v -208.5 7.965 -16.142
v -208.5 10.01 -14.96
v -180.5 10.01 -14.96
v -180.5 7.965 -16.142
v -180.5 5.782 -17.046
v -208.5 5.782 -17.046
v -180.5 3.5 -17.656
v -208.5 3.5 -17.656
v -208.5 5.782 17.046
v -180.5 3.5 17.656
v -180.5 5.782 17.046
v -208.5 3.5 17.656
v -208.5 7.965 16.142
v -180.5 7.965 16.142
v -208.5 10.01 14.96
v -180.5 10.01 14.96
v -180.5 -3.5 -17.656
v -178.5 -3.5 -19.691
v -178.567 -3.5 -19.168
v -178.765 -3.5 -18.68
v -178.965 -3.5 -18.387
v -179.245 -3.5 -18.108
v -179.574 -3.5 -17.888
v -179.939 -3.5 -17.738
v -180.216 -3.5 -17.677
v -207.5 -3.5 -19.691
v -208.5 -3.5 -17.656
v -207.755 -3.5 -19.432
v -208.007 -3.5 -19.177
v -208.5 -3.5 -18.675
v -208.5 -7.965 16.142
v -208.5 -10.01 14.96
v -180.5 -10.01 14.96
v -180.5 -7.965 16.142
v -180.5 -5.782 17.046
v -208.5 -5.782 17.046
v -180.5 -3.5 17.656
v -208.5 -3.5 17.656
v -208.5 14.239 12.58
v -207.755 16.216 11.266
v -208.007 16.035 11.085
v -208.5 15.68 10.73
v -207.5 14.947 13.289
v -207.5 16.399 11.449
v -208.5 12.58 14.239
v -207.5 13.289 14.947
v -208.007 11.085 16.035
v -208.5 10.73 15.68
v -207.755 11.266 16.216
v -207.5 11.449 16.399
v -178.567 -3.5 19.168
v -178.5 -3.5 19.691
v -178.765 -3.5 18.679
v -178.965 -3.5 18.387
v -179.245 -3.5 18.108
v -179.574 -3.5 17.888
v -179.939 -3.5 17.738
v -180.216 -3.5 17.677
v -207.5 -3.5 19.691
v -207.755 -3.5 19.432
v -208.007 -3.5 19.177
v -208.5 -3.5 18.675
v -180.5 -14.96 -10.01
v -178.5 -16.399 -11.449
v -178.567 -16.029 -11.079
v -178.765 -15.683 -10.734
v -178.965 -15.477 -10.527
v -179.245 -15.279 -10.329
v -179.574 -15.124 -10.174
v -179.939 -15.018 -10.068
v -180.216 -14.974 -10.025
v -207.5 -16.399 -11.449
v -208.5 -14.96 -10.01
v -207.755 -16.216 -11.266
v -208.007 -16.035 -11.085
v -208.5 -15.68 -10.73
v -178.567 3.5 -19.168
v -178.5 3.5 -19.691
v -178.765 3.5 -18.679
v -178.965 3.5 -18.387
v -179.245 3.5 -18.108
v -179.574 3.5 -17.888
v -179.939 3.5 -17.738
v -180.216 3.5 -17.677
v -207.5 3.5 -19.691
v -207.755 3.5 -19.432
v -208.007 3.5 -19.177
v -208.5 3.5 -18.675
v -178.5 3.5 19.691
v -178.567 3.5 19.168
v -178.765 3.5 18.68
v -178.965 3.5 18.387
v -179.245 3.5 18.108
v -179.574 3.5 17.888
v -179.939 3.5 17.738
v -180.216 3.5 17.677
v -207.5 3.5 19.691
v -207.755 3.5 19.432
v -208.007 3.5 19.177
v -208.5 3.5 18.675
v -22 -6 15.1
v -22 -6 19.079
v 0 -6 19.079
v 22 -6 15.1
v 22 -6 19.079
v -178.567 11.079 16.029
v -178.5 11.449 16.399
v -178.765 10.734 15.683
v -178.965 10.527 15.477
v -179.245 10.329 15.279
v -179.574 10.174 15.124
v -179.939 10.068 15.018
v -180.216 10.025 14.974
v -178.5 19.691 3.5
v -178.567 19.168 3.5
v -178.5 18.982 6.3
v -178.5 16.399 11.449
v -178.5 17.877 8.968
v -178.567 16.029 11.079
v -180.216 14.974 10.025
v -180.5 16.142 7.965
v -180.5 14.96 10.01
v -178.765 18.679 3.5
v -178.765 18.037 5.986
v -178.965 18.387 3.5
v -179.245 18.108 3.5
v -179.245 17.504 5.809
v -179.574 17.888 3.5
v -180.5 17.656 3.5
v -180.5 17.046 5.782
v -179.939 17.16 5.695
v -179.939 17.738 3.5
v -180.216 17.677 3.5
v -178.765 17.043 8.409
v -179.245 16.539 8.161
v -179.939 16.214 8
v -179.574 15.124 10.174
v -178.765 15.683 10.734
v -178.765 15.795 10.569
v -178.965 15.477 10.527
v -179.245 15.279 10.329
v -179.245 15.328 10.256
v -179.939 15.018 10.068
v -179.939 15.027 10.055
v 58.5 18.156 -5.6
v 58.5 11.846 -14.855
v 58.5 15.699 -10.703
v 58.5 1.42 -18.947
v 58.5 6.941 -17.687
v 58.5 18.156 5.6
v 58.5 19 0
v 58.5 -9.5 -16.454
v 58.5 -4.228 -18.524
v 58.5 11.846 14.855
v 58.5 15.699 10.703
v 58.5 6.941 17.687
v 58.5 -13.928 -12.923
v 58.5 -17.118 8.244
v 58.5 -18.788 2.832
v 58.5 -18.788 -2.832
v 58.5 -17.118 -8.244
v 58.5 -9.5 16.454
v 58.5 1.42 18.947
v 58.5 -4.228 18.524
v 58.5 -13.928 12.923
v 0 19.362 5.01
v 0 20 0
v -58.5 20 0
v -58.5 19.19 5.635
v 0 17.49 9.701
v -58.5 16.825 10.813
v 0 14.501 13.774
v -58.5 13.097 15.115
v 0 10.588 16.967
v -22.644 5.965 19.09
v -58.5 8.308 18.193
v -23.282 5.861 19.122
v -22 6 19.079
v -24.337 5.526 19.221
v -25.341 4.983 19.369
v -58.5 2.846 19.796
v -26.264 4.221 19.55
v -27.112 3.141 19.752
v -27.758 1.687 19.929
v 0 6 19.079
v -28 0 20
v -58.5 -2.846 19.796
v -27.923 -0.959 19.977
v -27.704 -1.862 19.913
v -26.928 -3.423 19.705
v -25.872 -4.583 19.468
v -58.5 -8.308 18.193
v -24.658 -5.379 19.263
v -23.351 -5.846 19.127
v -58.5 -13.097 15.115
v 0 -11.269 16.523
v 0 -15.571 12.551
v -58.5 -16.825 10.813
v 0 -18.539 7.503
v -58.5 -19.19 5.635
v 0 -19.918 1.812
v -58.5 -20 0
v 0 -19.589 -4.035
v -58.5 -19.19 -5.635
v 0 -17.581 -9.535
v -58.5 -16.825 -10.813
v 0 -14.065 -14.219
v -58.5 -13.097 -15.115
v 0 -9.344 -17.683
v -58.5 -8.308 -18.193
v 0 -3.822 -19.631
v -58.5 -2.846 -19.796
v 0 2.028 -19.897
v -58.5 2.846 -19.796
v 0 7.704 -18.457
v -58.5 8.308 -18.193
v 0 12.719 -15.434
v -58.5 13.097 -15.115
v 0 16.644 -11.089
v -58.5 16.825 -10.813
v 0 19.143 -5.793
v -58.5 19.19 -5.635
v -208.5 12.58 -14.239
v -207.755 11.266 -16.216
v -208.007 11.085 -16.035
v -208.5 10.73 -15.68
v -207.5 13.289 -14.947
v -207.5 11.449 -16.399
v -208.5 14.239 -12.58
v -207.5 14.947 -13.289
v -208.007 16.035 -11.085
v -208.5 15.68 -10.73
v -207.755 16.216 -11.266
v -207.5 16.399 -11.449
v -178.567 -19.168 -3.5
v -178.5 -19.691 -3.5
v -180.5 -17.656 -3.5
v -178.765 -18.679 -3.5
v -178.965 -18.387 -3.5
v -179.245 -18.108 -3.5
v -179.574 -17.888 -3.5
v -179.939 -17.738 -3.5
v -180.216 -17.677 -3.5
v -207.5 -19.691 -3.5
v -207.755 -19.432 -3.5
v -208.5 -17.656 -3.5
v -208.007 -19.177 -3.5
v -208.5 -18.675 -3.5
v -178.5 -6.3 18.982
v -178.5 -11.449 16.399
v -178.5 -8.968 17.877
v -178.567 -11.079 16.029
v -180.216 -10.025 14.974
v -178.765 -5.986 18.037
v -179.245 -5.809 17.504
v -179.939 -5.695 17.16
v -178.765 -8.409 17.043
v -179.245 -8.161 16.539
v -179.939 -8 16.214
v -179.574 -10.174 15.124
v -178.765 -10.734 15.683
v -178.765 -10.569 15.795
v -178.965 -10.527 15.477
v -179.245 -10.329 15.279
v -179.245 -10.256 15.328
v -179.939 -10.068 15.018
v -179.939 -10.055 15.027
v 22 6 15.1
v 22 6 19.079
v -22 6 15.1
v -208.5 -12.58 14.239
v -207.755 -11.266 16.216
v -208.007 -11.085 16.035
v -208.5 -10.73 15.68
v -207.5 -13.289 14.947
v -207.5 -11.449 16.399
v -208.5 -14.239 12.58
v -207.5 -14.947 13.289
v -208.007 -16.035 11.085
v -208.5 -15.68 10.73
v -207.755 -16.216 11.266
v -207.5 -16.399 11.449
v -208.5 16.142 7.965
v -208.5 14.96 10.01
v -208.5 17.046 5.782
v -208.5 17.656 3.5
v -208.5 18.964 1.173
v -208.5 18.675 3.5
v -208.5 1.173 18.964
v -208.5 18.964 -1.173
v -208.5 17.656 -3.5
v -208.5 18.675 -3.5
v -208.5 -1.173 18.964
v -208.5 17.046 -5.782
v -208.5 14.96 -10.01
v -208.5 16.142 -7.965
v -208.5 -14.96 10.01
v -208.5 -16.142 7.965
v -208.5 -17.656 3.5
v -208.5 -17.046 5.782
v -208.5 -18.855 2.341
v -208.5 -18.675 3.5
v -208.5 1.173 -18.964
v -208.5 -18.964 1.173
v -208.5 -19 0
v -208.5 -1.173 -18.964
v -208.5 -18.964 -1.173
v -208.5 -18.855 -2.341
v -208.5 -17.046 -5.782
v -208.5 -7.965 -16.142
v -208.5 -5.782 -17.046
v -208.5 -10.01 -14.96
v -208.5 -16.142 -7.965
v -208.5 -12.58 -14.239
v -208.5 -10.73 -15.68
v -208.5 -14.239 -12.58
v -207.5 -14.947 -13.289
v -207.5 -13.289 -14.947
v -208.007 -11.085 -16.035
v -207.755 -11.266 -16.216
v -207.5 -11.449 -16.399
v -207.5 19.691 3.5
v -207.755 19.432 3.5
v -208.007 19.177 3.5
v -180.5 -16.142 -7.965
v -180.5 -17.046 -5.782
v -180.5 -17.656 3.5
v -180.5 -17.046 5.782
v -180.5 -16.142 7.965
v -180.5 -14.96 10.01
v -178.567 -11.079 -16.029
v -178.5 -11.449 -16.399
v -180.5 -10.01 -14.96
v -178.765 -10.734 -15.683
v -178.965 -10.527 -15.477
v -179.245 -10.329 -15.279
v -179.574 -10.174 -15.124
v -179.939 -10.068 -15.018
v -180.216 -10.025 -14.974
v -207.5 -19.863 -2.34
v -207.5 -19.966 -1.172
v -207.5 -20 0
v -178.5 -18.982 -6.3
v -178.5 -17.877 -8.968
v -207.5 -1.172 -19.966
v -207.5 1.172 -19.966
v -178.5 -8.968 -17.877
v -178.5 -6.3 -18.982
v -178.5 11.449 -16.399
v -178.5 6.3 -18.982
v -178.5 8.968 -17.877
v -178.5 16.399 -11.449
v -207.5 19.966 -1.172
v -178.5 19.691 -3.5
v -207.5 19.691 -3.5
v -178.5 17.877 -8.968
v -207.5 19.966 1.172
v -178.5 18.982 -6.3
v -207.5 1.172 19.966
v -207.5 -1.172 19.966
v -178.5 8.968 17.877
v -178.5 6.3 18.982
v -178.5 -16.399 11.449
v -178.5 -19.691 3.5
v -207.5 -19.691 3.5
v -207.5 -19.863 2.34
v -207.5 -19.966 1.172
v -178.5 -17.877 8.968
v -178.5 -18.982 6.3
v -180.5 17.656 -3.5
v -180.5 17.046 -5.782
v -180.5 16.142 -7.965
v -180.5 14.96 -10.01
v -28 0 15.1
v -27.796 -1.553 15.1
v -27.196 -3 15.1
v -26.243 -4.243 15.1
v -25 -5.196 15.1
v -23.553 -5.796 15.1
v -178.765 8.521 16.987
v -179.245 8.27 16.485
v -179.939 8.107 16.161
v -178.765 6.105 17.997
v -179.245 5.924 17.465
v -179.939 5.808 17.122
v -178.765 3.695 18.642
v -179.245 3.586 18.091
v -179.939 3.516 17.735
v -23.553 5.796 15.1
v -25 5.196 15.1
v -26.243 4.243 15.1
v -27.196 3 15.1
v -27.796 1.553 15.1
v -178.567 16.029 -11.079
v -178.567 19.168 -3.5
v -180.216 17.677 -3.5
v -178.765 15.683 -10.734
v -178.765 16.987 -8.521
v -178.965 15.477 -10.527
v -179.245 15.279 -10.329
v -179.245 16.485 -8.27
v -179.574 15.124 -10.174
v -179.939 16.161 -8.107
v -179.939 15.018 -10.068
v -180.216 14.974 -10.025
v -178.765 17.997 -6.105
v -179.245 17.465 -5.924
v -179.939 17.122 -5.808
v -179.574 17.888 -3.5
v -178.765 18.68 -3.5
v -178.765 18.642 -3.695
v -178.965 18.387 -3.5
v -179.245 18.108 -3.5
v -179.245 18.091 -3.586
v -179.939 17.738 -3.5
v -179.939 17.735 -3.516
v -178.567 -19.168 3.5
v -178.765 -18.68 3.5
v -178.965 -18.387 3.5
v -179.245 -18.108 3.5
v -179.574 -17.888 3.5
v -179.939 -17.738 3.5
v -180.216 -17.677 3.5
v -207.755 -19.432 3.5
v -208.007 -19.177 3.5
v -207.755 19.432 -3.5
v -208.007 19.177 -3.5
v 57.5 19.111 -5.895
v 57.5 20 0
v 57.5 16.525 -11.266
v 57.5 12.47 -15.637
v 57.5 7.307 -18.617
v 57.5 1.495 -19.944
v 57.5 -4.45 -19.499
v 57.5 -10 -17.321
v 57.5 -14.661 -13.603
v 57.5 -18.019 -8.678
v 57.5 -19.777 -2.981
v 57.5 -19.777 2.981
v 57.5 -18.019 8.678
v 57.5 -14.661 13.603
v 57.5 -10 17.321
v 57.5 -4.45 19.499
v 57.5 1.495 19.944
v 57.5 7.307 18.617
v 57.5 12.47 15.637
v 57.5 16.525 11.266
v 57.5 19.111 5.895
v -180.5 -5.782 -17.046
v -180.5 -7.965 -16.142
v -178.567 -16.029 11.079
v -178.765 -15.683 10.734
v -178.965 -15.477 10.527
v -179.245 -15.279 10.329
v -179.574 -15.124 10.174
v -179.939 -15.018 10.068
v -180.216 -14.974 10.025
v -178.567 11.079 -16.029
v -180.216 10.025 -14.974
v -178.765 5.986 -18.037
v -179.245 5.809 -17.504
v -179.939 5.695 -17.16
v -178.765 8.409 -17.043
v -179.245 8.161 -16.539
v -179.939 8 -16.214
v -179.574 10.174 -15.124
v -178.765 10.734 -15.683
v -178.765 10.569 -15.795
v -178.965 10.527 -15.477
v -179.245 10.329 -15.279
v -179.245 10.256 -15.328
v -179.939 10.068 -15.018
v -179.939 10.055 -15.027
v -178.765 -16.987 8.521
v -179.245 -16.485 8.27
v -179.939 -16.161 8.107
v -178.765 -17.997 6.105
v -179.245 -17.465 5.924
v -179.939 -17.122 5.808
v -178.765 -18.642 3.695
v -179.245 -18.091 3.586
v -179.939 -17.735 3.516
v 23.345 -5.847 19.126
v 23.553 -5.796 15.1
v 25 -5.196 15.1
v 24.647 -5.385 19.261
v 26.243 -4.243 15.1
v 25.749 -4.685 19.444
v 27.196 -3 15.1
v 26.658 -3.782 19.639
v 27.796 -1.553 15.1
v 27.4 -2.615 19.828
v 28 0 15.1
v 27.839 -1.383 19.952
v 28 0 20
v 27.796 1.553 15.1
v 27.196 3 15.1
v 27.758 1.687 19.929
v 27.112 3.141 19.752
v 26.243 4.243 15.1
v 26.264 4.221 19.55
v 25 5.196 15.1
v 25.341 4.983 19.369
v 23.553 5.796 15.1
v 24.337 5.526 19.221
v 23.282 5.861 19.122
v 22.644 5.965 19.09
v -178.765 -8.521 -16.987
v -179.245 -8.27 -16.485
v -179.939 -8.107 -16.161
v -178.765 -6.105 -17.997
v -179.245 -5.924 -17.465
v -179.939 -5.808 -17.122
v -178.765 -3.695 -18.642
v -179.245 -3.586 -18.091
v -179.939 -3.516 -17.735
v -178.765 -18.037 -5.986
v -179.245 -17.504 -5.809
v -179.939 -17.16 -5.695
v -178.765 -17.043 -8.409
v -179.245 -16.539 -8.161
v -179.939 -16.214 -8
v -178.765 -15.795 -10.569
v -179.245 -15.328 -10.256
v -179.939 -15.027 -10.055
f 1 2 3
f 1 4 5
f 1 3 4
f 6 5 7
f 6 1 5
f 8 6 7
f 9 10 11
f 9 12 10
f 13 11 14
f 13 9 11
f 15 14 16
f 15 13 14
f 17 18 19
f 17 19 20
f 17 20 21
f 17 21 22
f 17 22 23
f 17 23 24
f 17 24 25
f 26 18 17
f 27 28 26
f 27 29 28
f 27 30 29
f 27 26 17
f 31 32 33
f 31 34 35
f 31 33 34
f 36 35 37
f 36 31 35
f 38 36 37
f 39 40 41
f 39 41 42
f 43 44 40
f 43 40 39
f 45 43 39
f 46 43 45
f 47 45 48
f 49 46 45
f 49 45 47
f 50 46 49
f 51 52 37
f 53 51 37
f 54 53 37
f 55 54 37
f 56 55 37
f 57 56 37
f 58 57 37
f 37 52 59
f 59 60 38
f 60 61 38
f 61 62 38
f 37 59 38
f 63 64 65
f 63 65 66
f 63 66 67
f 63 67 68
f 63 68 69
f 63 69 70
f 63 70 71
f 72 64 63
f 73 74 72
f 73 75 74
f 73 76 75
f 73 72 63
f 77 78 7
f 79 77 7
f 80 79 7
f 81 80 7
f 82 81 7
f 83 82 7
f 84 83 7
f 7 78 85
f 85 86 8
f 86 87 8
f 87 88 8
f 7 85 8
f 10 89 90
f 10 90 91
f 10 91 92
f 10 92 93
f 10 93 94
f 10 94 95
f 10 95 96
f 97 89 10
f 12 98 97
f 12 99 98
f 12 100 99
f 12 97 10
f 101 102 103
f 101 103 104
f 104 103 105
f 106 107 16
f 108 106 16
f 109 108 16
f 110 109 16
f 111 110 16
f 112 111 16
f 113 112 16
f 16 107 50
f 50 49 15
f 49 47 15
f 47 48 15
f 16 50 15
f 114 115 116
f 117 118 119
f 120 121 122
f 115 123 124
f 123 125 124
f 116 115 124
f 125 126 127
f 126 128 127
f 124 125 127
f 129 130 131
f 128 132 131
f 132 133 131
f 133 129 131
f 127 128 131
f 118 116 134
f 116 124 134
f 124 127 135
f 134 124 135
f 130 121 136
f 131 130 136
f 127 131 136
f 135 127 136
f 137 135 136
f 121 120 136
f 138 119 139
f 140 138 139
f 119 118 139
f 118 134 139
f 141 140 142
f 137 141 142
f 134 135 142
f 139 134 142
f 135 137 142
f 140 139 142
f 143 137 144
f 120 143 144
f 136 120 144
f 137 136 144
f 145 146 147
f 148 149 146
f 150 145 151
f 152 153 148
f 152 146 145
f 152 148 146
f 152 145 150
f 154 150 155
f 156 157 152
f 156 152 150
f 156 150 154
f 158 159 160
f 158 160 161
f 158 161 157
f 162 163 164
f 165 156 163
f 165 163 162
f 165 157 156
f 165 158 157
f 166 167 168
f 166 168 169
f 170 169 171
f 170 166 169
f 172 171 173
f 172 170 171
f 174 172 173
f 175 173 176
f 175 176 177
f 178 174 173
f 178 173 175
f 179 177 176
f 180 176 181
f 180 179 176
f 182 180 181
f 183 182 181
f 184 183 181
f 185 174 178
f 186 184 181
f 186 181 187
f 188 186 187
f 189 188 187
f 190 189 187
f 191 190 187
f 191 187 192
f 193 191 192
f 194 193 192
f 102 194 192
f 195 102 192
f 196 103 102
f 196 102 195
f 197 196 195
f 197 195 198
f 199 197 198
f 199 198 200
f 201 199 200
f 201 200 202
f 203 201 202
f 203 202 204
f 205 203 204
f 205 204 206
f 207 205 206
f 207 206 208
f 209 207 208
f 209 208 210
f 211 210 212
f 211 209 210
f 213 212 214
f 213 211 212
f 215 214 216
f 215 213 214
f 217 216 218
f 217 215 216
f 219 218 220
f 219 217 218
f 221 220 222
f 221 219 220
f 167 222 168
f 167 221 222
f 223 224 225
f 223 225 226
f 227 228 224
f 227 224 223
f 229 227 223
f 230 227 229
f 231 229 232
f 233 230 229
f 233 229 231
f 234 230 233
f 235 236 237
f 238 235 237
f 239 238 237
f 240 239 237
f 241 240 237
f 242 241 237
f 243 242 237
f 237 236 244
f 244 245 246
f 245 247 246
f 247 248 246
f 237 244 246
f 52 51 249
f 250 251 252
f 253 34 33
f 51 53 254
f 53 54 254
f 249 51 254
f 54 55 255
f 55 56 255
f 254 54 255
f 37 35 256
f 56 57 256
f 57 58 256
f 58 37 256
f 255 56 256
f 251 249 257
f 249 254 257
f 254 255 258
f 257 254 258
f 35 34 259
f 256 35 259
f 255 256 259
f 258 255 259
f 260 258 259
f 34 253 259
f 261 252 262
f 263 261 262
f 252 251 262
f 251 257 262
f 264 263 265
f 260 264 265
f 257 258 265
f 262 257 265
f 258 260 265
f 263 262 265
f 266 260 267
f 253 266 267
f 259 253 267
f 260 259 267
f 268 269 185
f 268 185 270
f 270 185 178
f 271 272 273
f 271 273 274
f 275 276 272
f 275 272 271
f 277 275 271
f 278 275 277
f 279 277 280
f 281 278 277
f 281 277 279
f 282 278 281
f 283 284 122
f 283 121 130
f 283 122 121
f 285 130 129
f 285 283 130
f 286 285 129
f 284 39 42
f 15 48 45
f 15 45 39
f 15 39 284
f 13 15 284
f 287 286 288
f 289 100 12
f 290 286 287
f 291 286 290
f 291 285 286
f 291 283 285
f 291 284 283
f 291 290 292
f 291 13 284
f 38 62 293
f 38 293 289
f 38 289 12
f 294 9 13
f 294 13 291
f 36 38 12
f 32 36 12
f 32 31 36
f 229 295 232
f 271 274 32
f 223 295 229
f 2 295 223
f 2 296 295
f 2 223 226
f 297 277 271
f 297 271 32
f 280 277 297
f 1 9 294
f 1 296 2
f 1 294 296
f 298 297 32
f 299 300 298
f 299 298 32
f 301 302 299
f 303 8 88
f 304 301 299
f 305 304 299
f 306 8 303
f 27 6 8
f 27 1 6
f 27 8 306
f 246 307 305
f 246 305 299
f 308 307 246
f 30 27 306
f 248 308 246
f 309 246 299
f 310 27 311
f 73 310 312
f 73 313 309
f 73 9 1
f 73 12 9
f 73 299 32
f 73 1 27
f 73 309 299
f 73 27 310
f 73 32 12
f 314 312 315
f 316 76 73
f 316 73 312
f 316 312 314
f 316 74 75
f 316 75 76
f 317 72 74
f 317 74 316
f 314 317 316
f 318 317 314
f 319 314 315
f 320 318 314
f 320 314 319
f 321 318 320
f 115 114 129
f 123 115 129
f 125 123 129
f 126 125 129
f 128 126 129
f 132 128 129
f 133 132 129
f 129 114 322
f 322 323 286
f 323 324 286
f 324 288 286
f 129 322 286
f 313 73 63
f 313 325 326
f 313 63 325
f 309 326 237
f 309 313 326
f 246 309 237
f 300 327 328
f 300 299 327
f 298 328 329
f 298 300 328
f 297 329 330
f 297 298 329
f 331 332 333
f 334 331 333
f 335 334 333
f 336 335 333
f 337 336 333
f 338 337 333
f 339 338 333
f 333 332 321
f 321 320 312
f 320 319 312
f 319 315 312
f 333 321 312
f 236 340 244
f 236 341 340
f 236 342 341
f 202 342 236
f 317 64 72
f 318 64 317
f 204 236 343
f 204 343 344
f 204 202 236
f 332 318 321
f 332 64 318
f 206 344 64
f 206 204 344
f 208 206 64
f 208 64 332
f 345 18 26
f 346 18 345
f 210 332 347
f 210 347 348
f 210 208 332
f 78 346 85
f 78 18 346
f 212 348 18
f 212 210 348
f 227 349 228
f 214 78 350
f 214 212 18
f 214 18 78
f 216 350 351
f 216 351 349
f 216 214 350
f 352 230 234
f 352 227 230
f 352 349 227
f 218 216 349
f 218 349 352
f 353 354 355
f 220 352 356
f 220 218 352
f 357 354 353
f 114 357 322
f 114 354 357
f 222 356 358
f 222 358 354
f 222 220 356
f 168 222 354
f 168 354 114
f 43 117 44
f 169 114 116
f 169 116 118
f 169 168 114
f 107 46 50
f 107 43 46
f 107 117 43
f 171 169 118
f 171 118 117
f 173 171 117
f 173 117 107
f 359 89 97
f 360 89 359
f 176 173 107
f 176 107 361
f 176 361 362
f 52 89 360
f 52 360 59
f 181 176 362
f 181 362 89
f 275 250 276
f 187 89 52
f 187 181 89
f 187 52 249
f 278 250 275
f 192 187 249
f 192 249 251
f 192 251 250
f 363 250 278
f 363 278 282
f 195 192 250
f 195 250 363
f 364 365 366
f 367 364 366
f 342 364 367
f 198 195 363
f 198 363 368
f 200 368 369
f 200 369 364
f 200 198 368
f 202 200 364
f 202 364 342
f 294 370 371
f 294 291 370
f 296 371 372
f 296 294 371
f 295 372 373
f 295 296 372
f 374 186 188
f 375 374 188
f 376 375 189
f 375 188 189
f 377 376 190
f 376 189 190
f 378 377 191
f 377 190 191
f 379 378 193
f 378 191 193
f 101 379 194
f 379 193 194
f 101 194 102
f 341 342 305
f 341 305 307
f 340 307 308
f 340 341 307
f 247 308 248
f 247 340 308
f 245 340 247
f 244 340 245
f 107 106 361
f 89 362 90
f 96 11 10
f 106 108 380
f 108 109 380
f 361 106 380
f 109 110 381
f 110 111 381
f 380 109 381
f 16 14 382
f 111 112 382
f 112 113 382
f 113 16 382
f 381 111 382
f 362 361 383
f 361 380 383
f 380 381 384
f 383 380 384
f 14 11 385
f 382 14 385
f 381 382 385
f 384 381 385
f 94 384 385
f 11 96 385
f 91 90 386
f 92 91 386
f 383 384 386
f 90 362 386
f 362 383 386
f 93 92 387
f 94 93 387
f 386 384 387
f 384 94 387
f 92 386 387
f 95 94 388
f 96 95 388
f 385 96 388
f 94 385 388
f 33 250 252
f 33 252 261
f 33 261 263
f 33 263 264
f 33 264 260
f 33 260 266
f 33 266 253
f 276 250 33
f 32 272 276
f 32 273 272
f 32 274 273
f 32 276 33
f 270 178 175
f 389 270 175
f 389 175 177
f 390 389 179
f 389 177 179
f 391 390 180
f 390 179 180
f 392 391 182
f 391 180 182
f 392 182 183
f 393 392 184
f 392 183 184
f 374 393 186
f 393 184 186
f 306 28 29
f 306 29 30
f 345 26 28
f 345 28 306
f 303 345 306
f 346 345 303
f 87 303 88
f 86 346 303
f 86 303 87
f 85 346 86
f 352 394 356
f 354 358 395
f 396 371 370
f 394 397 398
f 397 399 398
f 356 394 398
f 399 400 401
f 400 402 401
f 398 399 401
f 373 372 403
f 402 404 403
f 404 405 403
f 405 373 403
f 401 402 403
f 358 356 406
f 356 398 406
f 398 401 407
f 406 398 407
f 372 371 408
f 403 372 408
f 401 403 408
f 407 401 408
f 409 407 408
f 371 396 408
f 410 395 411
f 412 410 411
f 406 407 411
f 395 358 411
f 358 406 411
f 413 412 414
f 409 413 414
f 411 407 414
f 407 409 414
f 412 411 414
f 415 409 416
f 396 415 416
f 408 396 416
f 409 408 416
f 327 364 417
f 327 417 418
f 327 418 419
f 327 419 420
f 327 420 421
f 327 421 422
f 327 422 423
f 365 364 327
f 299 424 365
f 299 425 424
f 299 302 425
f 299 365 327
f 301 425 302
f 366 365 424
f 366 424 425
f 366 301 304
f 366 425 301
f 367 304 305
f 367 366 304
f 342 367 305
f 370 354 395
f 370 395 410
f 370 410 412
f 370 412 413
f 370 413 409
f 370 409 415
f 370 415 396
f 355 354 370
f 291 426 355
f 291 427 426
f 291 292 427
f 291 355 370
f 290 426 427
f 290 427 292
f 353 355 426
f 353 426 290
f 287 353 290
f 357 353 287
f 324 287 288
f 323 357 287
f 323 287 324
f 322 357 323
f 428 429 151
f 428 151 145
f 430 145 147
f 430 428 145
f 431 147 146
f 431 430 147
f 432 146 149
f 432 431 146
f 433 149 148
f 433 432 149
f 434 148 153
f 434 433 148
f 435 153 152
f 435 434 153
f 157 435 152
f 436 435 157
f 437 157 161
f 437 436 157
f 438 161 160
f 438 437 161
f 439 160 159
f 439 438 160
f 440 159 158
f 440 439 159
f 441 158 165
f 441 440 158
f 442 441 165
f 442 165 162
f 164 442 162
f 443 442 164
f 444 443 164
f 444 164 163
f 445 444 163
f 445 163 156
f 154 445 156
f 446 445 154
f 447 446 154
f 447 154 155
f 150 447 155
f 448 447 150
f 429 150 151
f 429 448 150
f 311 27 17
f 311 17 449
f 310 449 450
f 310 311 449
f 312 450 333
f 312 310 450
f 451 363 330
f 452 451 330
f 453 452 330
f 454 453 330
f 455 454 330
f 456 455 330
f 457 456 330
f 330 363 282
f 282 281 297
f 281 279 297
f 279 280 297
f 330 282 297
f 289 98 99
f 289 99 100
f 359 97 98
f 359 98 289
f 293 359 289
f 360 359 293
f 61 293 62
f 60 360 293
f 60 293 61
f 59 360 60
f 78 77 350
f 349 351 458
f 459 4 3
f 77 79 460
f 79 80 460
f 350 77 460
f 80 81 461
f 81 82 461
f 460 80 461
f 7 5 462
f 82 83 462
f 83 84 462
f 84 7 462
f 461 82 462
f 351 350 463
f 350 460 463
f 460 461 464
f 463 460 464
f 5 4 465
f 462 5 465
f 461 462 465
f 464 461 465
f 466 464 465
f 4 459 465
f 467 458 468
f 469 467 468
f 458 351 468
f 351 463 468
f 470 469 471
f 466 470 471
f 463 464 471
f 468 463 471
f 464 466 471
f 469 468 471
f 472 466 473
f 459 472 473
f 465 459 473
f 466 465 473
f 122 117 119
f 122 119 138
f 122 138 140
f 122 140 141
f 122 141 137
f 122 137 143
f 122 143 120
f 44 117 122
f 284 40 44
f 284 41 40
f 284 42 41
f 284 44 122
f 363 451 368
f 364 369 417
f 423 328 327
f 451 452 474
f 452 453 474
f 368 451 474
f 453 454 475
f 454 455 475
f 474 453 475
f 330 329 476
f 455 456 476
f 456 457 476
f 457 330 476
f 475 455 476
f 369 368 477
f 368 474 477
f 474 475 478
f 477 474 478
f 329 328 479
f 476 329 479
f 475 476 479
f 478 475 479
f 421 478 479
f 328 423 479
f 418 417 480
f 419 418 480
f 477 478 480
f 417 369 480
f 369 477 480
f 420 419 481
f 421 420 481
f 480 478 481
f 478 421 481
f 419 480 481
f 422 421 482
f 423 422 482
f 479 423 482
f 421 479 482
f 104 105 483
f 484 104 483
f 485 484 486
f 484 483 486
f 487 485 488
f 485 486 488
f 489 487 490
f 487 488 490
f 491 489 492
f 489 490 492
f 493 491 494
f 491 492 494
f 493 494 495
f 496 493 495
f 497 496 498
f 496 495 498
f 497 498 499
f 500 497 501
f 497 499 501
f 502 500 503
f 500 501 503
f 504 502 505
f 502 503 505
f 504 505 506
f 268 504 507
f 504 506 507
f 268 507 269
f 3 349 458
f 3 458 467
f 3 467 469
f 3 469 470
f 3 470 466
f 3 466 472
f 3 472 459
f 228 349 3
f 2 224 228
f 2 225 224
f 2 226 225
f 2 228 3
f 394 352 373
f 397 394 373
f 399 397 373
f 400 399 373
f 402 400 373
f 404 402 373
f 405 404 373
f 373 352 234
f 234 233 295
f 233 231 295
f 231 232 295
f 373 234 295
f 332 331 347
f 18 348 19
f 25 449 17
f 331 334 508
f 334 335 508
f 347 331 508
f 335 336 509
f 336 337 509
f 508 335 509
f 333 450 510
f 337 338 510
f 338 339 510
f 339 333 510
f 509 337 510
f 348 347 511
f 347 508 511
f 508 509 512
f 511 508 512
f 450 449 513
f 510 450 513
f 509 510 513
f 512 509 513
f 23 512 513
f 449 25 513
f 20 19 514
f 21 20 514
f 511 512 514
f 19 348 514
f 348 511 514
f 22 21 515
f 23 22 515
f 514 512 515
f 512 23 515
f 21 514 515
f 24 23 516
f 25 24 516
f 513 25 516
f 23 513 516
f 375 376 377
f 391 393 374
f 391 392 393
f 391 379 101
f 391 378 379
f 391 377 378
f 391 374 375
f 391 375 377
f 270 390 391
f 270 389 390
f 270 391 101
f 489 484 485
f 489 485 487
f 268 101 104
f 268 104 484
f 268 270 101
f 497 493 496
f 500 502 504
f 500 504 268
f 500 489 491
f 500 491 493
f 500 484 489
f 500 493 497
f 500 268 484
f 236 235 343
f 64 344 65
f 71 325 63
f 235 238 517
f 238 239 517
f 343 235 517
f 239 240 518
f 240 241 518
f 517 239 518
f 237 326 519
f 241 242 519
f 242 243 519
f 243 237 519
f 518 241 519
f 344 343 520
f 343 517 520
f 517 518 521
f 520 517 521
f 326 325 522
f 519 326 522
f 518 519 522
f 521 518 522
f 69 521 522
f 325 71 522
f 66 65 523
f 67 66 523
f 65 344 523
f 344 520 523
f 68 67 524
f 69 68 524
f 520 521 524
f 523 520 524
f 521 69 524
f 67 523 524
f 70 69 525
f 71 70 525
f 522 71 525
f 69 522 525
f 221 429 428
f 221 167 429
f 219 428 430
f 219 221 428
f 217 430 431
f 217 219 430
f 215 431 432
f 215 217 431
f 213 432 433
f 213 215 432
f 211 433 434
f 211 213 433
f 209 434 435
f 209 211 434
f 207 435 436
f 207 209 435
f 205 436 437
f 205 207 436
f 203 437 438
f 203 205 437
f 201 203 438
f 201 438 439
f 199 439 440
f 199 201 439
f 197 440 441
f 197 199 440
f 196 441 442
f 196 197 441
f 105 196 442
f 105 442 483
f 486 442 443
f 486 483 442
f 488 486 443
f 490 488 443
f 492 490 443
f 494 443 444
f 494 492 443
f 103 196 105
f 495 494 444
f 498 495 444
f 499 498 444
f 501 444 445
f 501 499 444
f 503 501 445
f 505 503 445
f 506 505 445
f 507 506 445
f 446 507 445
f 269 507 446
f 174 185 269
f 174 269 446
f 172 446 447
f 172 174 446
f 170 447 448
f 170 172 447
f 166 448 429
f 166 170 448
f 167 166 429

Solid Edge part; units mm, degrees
sketch "Sketch1" plane through (0, 0, 0) normal (1, 0, 0) x (0, 1, 0)
  circle A0 centre (0, 0) radius 20
extrude "Protrusion1" add sketch "Sketch1" along normal mid plane 117
sketch "Sketch2" plane through (-58.5, 0, 0) normal (-1, 0, 0) x (0, -1, 0)
  circle A0 centre (0, 0) radius 20
extrude "ProtrusiónExtruida_2" add sketch "Sketch2" along normal blind 150
sketch "Sketch3" plane through (-74.5, 0, 20) normal (0, 0, 1) x (-1, 0, 0)
  line L0 (-52.5, 6) -> (-96.5, 6)
  arc A0 (-96.5, 6) -> (-102.5, 0) centre (-96.5, 0) ccw
  arc A1 (-102.5, 0) -> (-96.5, -6) centre (-96.5, 0) ccw
  line L1 (-96.5, -6) -> (-52.5, -6)
  arc A2 (-46.5, 0) -> (-52.5, -6) centre (-52.5, 0) cw
  arc A3 (-52.5, 6) -> (-46.5, 0) centre (-52.5, 0) cw
extrude "VaciadoExtruido_3" cut sketch "Sketch3" against normal blind 4.9
chamfer "Chaflán_2" distance 1 angle 45 1 edges at (-208.5, 20, 0)
chamfer "Chaflán_3" distance 1 angle 45 1 edges at (58.5, -20, 0)
sketch "Sketch4" plane through (-208.5, 0, 0) normal (-1, 0, 0) x (0, -1, 0)
  line L0 (-11.449, 16.3988) -> (-10.0101, 14.9599)
  arc A0 (-10.0101, 14.9599) -> (-3.5, 17.6564) centre (0, 0) cw
  line L1 (-3.5, 19.6914) -> (-3.5, 17.6564)
  arc A1 (-11.449, 16.3988) -> (-3.5, 19.6914) centre (0, 0) cw
extrude "VaciadoExtruido_5" cut sketch "Sketch4" against normal blind 30
fillet "Redondeo_3" radius 2 1 edges at (-178.5, 6.8883, 16.6298)
pattern_circular "Pattern1" count 8 over 360 about axis through (-208.5, 0, 0) along (1, 0, 0) of "VaciadoExtruido_5", "Redondeo_3"
